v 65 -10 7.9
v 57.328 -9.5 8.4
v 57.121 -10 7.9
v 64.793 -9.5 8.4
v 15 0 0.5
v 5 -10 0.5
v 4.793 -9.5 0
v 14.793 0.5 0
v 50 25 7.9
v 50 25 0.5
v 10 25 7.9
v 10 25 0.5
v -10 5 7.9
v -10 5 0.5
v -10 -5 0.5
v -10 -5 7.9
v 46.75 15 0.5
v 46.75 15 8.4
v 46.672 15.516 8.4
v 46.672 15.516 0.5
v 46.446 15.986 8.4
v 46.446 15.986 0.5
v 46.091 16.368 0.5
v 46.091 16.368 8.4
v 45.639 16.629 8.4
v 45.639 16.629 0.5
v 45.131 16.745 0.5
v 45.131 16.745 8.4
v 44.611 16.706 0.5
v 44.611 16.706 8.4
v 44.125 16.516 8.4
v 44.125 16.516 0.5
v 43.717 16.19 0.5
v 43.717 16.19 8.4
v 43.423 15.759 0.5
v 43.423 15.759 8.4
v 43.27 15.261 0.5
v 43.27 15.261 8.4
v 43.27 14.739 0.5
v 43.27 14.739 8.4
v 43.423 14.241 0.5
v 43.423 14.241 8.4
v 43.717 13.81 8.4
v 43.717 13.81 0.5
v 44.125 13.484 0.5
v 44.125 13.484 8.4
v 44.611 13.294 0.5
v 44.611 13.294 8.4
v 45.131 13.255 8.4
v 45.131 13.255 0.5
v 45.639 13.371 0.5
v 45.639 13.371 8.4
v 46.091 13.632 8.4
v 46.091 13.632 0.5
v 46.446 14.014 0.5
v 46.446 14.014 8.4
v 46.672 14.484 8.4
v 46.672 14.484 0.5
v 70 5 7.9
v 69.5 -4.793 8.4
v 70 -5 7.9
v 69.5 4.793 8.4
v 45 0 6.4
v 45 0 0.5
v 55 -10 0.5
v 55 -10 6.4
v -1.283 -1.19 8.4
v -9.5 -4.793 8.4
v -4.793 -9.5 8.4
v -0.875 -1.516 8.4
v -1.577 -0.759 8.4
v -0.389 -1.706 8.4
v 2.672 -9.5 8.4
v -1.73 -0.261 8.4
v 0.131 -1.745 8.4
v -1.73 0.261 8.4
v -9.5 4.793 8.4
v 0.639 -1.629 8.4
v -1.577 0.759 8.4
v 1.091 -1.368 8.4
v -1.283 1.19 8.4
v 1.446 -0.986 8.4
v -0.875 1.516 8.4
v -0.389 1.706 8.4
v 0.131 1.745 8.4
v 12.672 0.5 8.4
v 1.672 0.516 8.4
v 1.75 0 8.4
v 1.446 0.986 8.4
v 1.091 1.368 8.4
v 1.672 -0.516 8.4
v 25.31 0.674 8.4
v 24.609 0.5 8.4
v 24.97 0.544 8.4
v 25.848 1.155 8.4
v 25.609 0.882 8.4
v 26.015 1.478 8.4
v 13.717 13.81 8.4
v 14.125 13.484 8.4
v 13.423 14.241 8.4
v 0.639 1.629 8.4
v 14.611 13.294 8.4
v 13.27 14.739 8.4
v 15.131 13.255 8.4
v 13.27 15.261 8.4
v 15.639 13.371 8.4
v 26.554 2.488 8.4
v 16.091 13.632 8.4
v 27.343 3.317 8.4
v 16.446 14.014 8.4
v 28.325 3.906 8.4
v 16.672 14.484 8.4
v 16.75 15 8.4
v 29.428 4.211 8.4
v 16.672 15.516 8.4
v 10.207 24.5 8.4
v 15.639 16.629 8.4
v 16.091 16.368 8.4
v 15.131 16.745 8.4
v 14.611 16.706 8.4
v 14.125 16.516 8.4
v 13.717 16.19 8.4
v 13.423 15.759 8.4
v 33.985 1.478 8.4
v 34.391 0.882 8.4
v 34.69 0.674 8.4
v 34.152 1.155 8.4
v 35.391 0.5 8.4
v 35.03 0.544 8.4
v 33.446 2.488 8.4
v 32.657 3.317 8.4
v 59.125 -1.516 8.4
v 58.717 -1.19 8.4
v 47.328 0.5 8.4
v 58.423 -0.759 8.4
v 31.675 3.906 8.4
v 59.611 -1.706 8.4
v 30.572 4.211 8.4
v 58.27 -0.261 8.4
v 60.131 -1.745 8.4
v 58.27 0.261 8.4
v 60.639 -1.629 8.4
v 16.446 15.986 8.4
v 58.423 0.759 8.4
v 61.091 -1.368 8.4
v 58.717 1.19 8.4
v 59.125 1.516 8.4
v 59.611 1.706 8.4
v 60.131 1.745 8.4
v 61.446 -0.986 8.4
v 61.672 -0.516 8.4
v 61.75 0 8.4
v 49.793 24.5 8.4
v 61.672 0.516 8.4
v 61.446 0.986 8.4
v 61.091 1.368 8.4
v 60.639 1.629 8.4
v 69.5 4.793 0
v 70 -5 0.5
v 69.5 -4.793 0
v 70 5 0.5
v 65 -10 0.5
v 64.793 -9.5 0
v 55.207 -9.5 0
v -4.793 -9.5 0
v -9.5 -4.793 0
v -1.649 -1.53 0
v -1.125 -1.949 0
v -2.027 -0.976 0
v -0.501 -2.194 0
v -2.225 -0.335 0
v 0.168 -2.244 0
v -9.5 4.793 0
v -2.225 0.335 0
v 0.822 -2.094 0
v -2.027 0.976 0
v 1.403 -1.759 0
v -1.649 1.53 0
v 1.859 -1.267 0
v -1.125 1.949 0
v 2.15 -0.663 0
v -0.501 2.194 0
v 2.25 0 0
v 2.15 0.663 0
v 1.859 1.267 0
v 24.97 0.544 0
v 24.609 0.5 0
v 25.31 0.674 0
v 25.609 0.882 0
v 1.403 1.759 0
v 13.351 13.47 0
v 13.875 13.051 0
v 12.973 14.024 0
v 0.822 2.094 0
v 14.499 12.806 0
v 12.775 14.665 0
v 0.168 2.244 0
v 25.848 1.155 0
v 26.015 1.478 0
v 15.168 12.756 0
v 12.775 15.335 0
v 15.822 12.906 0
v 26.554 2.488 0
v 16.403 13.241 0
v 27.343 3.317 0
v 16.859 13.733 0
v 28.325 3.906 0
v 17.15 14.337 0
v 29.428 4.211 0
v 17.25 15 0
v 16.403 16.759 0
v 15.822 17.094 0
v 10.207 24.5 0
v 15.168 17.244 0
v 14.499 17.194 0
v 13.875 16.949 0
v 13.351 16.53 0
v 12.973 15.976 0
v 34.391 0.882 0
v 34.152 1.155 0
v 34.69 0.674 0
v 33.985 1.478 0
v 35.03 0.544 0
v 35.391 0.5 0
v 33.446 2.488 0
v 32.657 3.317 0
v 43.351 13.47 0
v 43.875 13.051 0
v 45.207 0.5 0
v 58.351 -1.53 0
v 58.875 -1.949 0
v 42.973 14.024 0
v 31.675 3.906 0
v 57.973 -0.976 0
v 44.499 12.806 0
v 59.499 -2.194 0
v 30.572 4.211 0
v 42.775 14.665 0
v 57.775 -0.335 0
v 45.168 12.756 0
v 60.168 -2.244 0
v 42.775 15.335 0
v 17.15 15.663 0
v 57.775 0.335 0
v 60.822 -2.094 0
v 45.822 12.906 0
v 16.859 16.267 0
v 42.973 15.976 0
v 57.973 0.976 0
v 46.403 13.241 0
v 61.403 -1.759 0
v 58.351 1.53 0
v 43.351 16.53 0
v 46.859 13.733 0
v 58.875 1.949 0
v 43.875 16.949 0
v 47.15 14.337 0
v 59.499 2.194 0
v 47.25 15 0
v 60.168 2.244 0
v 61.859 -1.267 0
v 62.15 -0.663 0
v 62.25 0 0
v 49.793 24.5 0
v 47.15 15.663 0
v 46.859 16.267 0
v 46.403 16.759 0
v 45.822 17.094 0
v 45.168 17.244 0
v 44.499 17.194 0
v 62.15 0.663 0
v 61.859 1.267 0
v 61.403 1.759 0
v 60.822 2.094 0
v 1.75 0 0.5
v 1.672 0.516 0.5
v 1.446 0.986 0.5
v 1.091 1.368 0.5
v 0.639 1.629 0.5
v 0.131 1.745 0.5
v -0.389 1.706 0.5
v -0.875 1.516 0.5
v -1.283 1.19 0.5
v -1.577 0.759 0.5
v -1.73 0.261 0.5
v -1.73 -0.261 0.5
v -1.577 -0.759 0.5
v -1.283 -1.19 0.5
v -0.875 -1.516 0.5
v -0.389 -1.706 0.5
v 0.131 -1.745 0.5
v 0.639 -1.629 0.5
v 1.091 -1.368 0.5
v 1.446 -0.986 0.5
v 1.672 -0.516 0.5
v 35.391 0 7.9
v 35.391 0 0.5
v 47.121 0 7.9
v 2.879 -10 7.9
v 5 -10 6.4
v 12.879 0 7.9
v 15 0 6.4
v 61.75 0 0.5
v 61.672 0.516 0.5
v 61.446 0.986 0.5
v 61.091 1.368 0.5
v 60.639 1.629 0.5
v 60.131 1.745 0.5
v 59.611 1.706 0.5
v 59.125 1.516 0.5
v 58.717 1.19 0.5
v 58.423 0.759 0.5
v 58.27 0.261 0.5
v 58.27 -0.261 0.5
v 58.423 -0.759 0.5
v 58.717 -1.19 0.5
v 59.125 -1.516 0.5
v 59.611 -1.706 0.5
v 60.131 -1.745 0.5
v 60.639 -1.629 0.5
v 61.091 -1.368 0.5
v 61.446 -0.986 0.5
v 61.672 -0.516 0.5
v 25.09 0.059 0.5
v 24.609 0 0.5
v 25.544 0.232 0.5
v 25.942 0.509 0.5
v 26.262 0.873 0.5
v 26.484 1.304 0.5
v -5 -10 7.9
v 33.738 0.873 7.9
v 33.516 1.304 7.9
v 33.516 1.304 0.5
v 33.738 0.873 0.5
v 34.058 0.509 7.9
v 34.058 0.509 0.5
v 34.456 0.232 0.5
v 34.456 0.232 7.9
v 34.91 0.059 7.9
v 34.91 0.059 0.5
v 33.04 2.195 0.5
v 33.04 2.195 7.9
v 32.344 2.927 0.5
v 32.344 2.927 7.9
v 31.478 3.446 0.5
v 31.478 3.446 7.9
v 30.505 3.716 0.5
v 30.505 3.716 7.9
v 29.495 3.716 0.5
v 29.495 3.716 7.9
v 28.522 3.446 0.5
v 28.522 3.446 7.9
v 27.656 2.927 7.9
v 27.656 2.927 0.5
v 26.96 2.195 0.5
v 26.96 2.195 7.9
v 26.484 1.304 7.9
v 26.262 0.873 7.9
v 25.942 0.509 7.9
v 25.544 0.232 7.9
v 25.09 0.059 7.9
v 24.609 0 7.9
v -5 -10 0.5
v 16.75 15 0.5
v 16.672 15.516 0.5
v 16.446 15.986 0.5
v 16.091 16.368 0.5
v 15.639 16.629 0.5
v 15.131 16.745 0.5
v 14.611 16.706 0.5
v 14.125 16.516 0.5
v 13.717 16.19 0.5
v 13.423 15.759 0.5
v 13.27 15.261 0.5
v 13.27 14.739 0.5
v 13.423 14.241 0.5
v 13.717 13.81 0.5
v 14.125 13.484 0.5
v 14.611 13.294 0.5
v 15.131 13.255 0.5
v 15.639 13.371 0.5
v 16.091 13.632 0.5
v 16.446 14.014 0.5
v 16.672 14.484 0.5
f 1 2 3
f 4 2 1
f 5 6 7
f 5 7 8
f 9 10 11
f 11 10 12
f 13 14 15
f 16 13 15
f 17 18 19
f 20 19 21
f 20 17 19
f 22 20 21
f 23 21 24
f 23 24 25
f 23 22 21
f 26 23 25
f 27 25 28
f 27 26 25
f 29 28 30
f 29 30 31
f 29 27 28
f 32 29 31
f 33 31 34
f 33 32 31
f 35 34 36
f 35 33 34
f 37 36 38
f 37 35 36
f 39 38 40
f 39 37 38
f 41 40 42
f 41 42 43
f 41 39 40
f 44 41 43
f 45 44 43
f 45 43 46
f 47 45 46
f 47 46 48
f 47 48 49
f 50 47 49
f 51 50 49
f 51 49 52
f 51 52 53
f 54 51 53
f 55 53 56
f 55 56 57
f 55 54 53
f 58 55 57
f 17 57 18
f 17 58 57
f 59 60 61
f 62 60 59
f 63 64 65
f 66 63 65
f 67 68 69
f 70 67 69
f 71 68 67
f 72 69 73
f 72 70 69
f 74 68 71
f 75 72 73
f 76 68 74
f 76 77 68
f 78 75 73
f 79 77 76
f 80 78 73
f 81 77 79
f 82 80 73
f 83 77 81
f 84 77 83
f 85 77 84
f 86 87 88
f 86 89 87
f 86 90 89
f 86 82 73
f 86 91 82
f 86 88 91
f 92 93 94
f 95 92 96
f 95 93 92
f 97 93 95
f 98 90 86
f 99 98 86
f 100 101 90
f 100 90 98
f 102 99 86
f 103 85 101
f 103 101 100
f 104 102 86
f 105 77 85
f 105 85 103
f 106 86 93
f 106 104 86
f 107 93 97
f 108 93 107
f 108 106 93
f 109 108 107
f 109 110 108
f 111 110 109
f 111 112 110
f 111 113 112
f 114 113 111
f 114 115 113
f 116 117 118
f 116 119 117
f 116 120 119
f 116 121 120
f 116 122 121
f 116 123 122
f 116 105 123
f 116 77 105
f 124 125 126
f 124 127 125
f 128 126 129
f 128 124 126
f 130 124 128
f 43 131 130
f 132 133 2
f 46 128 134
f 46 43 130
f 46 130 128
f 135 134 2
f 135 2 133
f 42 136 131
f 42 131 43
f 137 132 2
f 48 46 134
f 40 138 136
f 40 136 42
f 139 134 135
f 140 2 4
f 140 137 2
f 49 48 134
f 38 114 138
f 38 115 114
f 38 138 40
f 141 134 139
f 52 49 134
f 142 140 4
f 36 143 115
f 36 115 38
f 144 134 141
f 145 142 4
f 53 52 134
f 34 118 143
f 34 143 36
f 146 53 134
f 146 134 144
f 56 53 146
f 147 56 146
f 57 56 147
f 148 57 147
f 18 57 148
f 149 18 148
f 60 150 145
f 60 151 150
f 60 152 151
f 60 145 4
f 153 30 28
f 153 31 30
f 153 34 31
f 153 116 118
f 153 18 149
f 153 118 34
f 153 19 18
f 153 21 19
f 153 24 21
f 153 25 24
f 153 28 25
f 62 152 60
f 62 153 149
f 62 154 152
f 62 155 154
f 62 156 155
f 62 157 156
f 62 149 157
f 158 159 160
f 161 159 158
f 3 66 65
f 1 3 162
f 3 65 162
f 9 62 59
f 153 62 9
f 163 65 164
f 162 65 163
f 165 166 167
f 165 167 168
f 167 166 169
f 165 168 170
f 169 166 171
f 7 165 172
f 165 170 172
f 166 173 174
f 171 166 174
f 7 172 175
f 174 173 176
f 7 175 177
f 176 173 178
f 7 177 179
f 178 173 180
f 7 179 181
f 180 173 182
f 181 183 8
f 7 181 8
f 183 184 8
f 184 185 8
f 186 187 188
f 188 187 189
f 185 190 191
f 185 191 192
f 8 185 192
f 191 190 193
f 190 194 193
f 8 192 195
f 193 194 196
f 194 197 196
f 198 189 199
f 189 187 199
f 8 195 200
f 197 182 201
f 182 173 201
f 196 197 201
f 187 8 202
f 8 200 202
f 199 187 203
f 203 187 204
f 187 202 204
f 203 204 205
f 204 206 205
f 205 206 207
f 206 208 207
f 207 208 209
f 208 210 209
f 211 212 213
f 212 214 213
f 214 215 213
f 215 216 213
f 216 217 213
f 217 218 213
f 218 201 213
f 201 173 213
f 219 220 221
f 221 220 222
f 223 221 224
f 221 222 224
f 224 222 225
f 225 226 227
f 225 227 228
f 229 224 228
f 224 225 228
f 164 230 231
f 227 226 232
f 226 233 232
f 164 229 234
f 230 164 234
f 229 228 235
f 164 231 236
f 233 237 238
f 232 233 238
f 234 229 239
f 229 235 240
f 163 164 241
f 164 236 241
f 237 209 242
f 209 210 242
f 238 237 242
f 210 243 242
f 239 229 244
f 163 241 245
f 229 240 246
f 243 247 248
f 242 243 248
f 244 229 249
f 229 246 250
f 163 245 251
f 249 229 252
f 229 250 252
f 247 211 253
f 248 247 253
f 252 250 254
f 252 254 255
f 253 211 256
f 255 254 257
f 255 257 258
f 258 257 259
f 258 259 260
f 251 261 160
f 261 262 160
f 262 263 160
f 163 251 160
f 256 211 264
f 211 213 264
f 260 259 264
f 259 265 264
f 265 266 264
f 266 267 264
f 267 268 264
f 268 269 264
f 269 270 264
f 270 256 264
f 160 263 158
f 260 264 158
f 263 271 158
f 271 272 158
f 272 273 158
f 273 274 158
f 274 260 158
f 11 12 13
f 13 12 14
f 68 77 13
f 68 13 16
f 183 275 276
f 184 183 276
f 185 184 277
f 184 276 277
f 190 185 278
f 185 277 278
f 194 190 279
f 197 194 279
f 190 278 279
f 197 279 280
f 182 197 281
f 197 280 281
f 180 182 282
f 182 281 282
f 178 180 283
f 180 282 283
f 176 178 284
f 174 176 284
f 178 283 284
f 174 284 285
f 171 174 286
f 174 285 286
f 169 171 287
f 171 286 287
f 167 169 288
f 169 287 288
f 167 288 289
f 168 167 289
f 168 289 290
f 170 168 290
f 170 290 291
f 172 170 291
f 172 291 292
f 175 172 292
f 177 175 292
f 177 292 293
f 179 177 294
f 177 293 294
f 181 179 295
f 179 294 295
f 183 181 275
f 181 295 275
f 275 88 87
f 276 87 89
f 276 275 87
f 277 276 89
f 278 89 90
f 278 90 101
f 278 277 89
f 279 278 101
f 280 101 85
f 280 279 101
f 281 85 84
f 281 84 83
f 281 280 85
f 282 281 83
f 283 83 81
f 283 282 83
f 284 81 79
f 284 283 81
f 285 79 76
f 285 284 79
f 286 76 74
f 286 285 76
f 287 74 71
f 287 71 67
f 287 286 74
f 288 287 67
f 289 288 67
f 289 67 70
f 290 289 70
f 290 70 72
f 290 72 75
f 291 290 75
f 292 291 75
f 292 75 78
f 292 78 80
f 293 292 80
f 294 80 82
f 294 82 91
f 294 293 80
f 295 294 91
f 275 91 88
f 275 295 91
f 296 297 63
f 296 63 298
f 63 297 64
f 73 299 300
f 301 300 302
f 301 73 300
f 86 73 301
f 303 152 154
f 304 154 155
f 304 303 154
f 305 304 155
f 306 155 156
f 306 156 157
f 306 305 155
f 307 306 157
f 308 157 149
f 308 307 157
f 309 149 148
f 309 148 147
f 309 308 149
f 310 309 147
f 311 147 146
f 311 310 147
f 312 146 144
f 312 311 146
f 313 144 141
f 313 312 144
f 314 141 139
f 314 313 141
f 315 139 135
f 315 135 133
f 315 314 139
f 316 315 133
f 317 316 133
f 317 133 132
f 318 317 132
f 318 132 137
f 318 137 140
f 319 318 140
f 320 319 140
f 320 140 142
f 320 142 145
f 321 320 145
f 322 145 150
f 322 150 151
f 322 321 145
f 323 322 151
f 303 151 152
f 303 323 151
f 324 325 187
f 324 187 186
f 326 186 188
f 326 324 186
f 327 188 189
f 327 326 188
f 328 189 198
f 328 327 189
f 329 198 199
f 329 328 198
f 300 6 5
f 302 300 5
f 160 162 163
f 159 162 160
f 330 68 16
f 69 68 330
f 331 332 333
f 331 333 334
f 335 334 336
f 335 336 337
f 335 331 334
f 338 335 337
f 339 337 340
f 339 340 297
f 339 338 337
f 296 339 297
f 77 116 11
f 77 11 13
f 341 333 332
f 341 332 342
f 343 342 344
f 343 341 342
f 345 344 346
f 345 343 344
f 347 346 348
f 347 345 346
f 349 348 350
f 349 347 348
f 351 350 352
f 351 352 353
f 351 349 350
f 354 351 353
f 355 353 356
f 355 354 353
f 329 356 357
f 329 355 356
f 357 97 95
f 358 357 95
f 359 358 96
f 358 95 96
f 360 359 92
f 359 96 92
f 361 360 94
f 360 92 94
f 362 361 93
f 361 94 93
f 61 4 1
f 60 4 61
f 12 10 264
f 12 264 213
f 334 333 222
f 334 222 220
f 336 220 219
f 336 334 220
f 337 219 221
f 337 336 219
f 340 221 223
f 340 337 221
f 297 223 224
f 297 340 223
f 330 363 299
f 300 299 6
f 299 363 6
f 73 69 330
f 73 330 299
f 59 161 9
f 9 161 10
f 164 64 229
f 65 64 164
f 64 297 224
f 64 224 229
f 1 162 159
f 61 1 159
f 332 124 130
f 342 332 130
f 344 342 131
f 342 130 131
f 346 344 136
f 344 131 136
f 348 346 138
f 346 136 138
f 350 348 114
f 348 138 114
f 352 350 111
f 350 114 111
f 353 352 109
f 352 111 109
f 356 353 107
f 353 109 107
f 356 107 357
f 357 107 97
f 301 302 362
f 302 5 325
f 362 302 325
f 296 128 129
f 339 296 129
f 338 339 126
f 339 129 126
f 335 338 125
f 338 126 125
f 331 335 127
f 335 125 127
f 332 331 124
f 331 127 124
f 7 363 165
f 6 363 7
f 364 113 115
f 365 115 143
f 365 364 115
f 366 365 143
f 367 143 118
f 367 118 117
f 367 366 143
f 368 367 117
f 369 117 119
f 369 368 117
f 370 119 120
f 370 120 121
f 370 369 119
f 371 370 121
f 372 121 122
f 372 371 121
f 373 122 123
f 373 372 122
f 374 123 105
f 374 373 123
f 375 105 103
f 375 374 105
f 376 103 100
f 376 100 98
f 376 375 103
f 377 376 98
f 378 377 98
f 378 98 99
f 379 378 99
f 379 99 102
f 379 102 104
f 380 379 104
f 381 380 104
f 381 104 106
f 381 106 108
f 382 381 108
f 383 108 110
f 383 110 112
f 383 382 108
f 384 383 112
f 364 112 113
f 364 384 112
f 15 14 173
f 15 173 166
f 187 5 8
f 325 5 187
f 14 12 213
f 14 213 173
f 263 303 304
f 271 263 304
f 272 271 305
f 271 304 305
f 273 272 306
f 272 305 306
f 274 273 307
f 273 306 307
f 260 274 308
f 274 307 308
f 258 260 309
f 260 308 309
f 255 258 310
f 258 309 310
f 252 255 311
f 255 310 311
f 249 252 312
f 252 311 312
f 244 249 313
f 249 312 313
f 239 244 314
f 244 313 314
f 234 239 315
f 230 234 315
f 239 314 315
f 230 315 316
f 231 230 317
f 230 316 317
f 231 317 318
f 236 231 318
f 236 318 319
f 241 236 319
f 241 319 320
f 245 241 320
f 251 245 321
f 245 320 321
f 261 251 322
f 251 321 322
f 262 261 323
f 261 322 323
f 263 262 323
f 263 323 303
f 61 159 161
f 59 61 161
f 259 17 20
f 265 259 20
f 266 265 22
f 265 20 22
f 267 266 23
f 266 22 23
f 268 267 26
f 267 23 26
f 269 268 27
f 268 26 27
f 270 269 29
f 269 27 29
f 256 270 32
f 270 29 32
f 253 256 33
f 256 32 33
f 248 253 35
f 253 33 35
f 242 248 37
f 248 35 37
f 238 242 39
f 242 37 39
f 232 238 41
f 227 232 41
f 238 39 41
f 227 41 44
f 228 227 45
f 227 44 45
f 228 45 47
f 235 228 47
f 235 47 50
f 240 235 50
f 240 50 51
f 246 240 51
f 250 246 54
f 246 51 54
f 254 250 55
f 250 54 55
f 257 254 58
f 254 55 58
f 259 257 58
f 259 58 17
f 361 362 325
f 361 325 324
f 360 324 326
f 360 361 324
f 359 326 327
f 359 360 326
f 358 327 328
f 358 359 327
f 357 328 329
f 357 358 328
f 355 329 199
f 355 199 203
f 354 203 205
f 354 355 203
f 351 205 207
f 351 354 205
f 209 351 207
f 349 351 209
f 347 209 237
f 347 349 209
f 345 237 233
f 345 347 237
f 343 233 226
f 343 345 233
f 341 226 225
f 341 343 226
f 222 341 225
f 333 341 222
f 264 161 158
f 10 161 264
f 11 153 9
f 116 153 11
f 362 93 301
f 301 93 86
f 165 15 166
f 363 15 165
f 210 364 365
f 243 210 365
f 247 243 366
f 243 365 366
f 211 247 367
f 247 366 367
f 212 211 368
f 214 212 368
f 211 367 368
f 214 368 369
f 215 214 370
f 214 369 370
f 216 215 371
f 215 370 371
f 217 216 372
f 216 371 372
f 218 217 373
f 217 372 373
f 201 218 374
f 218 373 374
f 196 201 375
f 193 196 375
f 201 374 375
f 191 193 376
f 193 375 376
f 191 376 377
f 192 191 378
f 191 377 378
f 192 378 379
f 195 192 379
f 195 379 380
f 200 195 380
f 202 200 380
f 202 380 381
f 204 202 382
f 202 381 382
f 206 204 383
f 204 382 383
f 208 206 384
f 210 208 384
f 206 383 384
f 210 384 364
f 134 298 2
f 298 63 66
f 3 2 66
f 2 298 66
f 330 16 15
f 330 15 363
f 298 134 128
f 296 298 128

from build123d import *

# Parameters (mm, degrees)
SKETCH_R        = 1.75
PAD_DEPTH       = 8.4
FILLET_R        = 2
CHAMFER001_SIZE = 2
CHAMFER_SIZE    = 0.5


with BuildPart() as part:
    # Sketch → Pad (new body)
    with BuildSketch(Plane.XY):
        with BuildLine():
            Line((-10, -5), (-5, -10))
            Line((-5, -10), (5, -10))
            Line((5, -10), (15, 0))
            Line((15, 0), (26.25, 0))
            ThreePointArc((33.75, 0), (30, 3.75), (26.25, 0))
            Line((33.75, 0), (45, 0))
            Line((45, 0), (55, -10))
            Line((55, -10), (65, -10))
            Line((65, -10), (70, -5))
            Line((70, -5), (70, 5))
            Line((70, 5), (50, 25))
            Line((50, 25), (10, 25))
            Line((10, 25), (-10, 5))
            Line((-10, 5), (-10, -5))
        make_face()
        Circle(SKETCH_R, mode=Mode.SUBTRACT)
        with Locations((15, 15)):
            Circle(SKETCH_R, mode=Mode.SUBTRACT)
        with Locations((45, 15)):
            Circle(SKETCH_R, mode=Mode.SUBTRACT)
        with Locations((60, 0)):
            Circle(SKETCH_R, mode=Mode.SUBTRACT)
    extrude(amount=PAD_DEPTH)

    # Fillet
    fillet_edges = [part.edges().sort_by_distance(p)[0] for p in [
        (33.75, 0, 4.2),
        (26.25, 0, 4.2),
    ]]
    fillet(fillet_edges, radius=FILLET_R)

    # Chamfer001
    chamfer001_edges = [part.edges().sort_by_distance(p)[0] for p in [
        (10, -5, 8.4),
        (50, -5, 8.4),
    ]]
    chamfer(chamfer001_edges, length=CHAMFER001_SIZE)

    # Chamfer
    chamfer_edges = [part.edges().sort_by_distance(p)[0] for p in [
        (40.195482, 0, 0),
        (34.248884, 0.358156, 0),
        (50, -5, 0),
        (30, 3.75, 0),
        (60, -10, 0),
        (25.751116, 0.358156, 0),
        (67.5, -7.5, 0),
        (19.804518, 0, 0),
        (70, 0, 0),
        (10, -5, 0),
        (60, 15, 0),
        (0, -10, 0),
        (30, 25, 0),
        (-7.5, -7.5, 0),
        (0, 15, 0),
        (-10, 0, 0),
        (58.25, 0, 0),
        (43.25, 15, 0),
        (13.25, 15, 0),
        (-1.75, 0, 0),
        (19.804518, 0, 8.4),
        (-1.414214, -10, 8.4),
        (61.414214, -10, 8.4),
        (67.5, -7.5, 8.4),
        (70, 0, 8.4),
        (-7.5, -7.5, 8.4),
        (-10, 0, 8.4),
        (0, 15, 8.4),
        (30, 25, 8.4),
        (60, 15, 8.4),
    ]]
    chamfer(chamfer_edges, length=CHAMFER_SIZE)


solid = part.part
